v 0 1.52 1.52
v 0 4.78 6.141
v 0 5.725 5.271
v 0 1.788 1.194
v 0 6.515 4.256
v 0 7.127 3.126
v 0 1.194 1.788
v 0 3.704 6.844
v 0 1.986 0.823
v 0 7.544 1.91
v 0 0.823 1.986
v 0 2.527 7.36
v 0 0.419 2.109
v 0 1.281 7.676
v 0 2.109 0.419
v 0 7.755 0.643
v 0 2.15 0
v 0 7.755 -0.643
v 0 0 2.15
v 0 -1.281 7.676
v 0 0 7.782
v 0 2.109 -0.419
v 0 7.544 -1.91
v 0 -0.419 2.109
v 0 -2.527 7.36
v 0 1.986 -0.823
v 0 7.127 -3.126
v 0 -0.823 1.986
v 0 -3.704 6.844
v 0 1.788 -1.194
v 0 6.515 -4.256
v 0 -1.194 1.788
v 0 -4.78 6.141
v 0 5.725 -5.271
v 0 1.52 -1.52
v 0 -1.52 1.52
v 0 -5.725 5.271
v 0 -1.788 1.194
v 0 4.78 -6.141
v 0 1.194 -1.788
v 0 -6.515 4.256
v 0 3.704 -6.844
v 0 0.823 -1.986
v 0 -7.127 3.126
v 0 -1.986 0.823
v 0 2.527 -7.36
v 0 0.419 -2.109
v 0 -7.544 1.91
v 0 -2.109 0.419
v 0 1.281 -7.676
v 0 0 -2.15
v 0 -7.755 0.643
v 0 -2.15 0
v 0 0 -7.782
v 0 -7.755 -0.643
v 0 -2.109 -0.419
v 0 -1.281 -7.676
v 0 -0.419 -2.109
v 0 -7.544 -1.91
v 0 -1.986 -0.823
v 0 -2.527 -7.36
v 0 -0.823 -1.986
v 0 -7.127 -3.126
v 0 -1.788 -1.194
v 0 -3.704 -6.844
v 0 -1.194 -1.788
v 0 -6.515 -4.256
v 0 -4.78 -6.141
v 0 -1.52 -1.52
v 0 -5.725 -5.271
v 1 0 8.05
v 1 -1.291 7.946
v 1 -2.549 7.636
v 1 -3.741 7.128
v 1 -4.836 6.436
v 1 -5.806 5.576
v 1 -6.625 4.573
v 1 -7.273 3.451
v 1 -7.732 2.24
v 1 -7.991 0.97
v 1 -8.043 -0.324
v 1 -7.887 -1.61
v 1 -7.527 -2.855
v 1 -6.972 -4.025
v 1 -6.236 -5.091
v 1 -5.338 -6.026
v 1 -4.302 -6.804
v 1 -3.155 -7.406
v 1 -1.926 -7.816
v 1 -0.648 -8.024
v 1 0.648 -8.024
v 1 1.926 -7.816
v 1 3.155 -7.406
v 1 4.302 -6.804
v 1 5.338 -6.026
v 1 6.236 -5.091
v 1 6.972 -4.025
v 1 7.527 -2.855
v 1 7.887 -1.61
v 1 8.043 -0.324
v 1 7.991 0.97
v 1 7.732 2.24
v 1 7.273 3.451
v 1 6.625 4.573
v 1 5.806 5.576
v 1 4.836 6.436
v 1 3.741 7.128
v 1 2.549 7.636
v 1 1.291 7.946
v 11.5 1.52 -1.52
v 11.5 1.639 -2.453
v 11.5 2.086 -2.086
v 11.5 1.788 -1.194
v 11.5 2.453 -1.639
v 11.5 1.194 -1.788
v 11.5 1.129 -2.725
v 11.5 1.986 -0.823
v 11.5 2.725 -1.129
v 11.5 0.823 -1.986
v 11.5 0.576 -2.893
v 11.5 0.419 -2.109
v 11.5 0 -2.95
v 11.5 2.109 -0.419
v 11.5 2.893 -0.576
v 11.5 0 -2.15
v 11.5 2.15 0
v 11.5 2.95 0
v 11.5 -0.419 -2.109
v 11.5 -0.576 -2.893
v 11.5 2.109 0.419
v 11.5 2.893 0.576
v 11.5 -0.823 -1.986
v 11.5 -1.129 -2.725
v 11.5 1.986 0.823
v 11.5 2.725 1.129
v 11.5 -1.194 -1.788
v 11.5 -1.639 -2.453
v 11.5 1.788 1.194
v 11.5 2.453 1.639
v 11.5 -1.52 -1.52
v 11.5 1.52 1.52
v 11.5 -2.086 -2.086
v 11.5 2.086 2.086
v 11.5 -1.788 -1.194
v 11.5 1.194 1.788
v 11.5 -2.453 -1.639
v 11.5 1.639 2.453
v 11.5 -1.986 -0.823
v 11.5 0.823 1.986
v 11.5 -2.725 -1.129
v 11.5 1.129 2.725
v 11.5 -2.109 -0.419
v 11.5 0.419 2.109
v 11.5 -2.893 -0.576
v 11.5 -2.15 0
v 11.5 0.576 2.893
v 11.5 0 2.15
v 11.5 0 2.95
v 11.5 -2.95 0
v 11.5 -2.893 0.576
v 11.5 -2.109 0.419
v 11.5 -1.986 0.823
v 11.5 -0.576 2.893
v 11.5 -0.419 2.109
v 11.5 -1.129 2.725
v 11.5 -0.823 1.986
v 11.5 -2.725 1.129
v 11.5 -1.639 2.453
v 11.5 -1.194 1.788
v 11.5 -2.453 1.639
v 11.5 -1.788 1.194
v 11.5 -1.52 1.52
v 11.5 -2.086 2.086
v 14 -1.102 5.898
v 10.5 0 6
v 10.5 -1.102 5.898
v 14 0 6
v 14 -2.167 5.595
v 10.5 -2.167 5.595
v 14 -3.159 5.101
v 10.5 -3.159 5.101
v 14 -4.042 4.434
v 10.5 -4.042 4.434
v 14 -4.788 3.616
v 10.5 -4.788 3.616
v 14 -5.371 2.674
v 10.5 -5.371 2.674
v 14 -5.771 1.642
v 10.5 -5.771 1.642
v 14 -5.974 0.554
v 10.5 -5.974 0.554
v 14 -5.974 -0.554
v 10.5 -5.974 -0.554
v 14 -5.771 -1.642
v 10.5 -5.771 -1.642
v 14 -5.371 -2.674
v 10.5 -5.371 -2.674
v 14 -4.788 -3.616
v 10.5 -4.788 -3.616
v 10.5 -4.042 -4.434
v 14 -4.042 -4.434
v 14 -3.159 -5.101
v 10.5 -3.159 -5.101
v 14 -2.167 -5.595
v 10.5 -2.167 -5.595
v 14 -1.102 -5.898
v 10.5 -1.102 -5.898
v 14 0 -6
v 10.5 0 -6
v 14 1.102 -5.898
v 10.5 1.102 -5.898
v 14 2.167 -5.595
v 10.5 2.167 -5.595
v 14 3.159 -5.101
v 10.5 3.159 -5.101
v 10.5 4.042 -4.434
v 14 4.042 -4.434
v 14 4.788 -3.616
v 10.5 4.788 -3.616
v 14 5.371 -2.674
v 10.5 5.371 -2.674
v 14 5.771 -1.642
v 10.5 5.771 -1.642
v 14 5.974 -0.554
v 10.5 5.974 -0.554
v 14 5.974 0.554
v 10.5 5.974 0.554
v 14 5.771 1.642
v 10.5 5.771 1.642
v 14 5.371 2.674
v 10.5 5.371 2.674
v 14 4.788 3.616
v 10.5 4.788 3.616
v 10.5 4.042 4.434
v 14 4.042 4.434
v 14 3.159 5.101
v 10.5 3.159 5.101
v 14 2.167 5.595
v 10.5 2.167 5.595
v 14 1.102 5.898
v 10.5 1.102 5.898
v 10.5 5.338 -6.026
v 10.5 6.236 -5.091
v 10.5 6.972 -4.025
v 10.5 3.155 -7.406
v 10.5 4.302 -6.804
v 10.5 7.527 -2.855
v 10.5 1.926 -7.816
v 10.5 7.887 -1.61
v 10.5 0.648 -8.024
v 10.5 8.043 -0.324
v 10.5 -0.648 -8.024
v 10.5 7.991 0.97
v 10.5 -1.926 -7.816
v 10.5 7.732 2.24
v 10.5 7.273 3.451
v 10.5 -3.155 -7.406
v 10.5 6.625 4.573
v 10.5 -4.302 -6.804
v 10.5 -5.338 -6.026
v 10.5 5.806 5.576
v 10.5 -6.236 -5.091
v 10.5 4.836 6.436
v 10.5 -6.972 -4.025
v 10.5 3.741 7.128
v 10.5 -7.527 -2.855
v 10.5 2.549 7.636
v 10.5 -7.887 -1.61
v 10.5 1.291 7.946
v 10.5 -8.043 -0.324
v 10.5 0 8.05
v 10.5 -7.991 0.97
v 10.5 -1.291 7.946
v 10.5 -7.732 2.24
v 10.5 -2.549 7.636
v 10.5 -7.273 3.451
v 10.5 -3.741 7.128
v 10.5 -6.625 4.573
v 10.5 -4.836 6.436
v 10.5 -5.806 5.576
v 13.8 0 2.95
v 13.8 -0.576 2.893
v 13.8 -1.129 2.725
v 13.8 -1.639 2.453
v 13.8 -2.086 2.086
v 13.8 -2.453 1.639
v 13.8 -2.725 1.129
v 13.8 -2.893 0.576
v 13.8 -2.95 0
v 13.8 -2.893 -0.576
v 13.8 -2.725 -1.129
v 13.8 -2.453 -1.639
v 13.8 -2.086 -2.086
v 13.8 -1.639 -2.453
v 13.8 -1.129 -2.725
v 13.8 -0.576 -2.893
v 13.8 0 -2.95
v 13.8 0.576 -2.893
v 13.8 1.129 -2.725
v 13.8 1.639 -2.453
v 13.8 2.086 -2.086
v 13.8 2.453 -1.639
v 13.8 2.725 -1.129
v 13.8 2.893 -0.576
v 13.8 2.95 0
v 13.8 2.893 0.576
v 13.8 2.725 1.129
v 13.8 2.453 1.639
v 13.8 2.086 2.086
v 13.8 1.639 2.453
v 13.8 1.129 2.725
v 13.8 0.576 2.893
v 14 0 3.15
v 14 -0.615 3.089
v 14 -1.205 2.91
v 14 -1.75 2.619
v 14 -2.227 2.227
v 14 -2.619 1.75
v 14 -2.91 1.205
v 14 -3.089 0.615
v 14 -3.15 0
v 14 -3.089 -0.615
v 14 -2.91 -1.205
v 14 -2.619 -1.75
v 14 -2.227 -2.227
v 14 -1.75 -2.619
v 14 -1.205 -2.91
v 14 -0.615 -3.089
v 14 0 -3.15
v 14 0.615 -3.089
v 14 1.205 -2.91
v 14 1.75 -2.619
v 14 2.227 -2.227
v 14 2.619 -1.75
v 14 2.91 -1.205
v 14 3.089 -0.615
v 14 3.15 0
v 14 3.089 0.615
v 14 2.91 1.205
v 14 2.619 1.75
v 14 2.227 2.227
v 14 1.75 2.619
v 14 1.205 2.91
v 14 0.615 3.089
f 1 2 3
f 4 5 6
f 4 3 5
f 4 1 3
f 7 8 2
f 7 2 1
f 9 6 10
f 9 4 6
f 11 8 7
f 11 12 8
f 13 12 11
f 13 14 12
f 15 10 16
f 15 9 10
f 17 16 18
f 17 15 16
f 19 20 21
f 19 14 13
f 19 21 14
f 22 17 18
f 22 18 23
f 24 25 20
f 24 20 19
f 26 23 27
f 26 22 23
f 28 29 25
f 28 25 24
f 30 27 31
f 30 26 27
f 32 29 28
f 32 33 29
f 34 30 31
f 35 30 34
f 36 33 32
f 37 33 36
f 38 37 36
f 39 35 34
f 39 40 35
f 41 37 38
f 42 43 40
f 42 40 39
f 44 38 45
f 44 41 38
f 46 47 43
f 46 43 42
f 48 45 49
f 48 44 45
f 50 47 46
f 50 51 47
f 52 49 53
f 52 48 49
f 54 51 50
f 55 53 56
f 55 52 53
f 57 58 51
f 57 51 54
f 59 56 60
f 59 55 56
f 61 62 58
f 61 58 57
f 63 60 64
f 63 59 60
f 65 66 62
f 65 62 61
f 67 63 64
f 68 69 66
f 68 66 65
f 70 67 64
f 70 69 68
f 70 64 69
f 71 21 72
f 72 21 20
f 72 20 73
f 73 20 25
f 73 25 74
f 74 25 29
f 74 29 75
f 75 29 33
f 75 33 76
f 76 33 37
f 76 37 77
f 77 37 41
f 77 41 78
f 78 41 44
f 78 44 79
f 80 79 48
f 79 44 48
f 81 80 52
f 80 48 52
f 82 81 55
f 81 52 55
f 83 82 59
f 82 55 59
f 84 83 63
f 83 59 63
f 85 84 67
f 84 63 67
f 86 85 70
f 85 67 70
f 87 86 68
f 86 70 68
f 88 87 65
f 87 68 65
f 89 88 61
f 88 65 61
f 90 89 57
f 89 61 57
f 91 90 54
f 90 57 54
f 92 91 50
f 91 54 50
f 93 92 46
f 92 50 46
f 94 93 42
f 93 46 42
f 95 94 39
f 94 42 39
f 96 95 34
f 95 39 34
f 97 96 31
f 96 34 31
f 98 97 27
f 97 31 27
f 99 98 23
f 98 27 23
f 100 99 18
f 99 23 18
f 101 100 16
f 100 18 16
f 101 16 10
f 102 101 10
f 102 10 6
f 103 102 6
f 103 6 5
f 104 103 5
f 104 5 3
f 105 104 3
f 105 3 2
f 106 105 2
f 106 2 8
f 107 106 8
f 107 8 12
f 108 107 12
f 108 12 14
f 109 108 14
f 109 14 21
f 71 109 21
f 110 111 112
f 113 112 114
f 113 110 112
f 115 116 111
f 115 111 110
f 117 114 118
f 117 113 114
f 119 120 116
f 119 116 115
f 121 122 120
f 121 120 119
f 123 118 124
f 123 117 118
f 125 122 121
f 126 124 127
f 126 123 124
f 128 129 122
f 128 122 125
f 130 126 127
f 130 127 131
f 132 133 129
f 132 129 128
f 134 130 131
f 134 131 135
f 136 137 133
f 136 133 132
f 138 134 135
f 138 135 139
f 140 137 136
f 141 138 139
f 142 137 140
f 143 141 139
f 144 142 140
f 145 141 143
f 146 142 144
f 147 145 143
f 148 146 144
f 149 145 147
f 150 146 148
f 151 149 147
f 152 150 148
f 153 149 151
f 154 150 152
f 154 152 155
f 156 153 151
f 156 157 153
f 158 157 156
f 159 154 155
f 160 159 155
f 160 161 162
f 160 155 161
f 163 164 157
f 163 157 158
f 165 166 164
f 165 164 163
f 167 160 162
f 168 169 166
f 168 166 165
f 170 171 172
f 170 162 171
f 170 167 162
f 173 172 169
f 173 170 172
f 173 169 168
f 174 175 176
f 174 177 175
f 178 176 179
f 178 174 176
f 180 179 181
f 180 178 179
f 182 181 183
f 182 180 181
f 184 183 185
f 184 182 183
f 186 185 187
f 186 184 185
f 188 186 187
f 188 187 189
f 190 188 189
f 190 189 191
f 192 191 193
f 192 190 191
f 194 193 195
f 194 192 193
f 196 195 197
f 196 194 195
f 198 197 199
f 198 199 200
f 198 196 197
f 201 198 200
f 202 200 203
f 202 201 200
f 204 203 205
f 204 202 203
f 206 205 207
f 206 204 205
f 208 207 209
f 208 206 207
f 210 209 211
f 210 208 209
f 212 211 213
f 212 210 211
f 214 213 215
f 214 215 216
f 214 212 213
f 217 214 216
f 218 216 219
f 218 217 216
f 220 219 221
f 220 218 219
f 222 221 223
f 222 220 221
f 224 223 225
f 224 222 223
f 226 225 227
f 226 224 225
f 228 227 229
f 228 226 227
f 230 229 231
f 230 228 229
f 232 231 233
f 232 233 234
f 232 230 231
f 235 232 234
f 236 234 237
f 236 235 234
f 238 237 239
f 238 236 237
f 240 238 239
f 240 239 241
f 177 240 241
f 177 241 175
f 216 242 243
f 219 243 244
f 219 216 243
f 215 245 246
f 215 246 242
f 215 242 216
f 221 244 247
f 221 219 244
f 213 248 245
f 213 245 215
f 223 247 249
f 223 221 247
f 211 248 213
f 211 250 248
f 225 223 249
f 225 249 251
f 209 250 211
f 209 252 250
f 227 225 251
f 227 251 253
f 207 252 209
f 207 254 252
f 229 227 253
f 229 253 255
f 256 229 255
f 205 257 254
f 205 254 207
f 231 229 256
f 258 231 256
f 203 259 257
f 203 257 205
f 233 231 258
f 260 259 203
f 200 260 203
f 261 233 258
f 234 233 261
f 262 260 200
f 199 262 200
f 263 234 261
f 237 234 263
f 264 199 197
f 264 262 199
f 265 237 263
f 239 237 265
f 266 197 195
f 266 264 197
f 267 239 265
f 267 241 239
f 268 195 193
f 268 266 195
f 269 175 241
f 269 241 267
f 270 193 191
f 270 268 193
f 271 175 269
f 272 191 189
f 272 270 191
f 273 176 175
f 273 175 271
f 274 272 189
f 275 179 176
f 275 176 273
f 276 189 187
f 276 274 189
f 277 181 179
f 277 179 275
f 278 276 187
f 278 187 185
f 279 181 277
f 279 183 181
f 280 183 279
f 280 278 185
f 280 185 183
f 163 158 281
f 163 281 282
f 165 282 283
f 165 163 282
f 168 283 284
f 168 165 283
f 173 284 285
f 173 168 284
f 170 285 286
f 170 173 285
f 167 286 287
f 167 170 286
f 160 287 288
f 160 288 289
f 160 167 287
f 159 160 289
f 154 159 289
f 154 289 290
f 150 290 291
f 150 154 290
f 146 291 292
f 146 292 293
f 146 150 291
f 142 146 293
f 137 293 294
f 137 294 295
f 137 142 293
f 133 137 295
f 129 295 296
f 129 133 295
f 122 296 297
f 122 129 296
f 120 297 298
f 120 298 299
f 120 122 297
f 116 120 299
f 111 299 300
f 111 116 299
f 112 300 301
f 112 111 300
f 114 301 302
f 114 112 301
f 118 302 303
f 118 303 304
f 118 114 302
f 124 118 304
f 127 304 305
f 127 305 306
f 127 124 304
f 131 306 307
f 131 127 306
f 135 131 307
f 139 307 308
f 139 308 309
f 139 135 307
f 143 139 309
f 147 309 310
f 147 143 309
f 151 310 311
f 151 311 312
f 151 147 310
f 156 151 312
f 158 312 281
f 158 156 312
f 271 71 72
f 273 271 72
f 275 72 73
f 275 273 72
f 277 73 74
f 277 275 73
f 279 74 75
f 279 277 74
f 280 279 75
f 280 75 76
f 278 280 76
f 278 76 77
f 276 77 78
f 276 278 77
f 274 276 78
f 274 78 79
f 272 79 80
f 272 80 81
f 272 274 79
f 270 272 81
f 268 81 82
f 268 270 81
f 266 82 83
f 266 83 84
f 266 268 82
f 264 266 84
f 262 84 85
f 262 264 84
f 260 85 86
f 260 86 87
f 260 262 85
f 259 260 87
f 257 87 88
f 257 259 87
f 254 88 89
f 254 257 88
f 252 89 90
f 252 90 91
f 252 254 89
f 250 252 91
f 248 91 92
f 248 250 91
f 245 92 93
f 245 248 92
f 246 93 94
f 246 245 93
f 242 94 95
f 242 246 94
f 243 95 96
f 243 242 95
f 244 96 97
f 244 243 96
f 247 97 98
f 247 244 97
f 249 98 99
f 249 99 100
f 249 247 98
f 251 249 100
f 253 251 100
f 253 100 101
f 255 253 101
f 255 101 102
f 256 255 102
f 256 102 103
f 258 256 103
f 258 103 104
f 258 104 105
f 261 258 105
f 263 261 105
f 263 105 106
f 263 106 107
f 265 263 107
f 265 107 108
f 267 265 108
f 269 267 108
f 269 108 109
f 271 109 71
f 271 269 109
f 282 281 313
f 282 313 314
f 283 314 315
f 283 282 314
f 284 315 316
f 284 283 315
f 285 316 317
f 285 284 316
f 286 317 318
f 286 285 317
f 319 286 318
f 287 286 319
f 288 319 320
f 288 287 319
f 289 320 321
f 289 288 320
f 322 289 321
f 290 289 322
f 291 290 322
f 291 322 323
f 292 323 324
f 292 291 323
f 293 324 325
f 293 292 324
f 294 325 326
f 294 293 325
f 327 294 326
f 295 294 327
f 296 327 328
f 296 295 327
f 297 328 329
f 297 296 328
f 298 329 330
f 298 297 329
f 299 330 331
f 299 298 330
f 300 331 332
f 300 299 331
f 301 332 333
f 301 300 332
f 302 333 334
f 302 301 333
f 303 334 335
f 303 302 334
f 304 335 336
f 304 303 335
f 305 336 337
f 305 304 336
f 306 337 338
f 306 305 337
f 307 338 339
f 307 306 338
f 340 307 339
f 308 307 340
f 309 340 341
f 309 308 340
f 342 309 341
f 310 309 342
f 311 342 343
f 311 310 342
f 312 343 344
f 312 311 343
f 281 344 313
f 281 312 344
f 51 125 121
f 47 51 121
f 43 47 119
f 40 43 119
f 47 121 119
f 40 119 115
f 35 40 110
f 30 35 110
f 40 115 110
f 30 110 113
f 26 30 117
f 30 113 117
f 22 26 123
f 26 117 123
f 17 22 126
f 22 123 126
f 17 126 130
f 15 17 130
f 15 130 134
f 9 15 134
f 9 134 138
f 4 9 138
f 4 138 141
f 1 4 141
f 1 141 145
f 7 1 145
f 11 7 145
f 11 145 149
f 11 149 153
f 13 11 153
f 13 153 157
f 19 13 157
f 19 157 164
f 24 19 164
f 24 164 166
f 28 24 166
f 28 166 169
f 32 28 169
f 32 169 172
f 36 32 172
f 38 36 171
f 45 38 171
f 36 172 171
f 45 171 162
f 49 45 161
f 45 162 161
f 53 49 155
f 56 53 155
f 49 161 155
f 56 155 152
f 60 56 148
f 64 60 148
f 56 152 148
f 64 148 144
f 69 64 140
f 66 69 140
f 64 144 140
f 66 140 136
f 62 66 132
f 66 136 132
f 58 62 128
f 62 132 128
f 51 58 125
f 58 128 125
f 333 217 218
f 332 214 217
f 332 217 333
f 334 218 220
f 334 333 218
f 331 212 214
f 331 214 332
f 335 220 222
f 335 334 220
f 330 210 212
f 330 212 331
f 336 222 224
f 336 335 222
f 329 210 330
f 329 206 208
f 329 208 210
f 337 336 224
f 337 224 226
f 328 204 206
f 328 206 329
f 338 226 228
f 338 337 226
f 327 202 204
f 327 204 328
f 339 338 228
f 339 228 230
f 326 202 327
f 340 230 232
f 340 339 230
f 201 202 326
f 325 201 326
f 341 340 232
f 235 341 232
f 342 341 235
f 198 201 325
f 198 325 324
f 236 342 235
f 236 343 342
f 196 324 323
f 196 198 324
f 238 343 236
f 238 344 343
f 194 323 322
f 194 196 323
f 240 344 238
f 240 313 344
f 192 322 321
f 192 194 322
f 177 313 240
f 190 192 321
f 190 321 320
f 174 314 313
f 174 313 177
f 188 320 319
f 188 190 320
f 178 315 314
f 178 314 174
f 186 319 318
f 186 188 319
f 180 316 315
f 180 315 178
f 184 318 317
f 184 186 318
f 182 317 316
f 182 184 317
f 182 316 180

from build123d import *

# Parameters (mm, degrees)
CHAMFER_1_SIZE  = 1
CHAMFER_1_SIZE2 = 0.267949192
CHAMFER_2_SIZE  = 0.2
HOLE_WIZARD_1_D = 4.3


with BuildPart() as part:
    # Эскиз1 → Повернуть1 (revolve)
    with BuildSketch(Plane.XY, mode=Mode.PRIVATE) as revolve_1_sk:
        Polygon((14, 2.95), (11.5, 2.95), (11.5, 0), (0, 0), (0, 8.05), (10.5, 8.05), (10.5, 6), (14, 6), align=None)
    revolve(revolve_1_sk.sketch.rotate(Axis((-5.881924198, 0, 0), (1, 0, 0)), 90), axis=Axis((-5.881924198, 0, 0), (1, 0, 0)))

    # Фаска1
    chamfer_1_edges = [part.edges().sort_by_distance(p)[0] for p in [
        (0, 0, -8.05),
    ]]
    chamfer_1_side = [part.faces().sort_by_distance(p)[0] for p in [
        (5.25, 0, -8.05),
    ]]
    chamfer(chamfer_1_edges, length=CHAMFER_1_SIZE, length2=CHAMFER_1_SIZE2, reference=chamfer_1_side[0])

    # Фаска2
    chamfer_2_edges = [part.edges().sort_by_distance(p)[0] for p in [
        (14, 0, -2.95),
    ]]
    chamfer(chamfer_2_edges, length=CHAMFER_2_SIZE)

    # Отверстие с зазором 1 (through all)
    with Locations(Plane.ZY):
        with Locations((0, 0)):
            Hole(HOLE_WIZARD_1_D / 2)


solid = part.part
